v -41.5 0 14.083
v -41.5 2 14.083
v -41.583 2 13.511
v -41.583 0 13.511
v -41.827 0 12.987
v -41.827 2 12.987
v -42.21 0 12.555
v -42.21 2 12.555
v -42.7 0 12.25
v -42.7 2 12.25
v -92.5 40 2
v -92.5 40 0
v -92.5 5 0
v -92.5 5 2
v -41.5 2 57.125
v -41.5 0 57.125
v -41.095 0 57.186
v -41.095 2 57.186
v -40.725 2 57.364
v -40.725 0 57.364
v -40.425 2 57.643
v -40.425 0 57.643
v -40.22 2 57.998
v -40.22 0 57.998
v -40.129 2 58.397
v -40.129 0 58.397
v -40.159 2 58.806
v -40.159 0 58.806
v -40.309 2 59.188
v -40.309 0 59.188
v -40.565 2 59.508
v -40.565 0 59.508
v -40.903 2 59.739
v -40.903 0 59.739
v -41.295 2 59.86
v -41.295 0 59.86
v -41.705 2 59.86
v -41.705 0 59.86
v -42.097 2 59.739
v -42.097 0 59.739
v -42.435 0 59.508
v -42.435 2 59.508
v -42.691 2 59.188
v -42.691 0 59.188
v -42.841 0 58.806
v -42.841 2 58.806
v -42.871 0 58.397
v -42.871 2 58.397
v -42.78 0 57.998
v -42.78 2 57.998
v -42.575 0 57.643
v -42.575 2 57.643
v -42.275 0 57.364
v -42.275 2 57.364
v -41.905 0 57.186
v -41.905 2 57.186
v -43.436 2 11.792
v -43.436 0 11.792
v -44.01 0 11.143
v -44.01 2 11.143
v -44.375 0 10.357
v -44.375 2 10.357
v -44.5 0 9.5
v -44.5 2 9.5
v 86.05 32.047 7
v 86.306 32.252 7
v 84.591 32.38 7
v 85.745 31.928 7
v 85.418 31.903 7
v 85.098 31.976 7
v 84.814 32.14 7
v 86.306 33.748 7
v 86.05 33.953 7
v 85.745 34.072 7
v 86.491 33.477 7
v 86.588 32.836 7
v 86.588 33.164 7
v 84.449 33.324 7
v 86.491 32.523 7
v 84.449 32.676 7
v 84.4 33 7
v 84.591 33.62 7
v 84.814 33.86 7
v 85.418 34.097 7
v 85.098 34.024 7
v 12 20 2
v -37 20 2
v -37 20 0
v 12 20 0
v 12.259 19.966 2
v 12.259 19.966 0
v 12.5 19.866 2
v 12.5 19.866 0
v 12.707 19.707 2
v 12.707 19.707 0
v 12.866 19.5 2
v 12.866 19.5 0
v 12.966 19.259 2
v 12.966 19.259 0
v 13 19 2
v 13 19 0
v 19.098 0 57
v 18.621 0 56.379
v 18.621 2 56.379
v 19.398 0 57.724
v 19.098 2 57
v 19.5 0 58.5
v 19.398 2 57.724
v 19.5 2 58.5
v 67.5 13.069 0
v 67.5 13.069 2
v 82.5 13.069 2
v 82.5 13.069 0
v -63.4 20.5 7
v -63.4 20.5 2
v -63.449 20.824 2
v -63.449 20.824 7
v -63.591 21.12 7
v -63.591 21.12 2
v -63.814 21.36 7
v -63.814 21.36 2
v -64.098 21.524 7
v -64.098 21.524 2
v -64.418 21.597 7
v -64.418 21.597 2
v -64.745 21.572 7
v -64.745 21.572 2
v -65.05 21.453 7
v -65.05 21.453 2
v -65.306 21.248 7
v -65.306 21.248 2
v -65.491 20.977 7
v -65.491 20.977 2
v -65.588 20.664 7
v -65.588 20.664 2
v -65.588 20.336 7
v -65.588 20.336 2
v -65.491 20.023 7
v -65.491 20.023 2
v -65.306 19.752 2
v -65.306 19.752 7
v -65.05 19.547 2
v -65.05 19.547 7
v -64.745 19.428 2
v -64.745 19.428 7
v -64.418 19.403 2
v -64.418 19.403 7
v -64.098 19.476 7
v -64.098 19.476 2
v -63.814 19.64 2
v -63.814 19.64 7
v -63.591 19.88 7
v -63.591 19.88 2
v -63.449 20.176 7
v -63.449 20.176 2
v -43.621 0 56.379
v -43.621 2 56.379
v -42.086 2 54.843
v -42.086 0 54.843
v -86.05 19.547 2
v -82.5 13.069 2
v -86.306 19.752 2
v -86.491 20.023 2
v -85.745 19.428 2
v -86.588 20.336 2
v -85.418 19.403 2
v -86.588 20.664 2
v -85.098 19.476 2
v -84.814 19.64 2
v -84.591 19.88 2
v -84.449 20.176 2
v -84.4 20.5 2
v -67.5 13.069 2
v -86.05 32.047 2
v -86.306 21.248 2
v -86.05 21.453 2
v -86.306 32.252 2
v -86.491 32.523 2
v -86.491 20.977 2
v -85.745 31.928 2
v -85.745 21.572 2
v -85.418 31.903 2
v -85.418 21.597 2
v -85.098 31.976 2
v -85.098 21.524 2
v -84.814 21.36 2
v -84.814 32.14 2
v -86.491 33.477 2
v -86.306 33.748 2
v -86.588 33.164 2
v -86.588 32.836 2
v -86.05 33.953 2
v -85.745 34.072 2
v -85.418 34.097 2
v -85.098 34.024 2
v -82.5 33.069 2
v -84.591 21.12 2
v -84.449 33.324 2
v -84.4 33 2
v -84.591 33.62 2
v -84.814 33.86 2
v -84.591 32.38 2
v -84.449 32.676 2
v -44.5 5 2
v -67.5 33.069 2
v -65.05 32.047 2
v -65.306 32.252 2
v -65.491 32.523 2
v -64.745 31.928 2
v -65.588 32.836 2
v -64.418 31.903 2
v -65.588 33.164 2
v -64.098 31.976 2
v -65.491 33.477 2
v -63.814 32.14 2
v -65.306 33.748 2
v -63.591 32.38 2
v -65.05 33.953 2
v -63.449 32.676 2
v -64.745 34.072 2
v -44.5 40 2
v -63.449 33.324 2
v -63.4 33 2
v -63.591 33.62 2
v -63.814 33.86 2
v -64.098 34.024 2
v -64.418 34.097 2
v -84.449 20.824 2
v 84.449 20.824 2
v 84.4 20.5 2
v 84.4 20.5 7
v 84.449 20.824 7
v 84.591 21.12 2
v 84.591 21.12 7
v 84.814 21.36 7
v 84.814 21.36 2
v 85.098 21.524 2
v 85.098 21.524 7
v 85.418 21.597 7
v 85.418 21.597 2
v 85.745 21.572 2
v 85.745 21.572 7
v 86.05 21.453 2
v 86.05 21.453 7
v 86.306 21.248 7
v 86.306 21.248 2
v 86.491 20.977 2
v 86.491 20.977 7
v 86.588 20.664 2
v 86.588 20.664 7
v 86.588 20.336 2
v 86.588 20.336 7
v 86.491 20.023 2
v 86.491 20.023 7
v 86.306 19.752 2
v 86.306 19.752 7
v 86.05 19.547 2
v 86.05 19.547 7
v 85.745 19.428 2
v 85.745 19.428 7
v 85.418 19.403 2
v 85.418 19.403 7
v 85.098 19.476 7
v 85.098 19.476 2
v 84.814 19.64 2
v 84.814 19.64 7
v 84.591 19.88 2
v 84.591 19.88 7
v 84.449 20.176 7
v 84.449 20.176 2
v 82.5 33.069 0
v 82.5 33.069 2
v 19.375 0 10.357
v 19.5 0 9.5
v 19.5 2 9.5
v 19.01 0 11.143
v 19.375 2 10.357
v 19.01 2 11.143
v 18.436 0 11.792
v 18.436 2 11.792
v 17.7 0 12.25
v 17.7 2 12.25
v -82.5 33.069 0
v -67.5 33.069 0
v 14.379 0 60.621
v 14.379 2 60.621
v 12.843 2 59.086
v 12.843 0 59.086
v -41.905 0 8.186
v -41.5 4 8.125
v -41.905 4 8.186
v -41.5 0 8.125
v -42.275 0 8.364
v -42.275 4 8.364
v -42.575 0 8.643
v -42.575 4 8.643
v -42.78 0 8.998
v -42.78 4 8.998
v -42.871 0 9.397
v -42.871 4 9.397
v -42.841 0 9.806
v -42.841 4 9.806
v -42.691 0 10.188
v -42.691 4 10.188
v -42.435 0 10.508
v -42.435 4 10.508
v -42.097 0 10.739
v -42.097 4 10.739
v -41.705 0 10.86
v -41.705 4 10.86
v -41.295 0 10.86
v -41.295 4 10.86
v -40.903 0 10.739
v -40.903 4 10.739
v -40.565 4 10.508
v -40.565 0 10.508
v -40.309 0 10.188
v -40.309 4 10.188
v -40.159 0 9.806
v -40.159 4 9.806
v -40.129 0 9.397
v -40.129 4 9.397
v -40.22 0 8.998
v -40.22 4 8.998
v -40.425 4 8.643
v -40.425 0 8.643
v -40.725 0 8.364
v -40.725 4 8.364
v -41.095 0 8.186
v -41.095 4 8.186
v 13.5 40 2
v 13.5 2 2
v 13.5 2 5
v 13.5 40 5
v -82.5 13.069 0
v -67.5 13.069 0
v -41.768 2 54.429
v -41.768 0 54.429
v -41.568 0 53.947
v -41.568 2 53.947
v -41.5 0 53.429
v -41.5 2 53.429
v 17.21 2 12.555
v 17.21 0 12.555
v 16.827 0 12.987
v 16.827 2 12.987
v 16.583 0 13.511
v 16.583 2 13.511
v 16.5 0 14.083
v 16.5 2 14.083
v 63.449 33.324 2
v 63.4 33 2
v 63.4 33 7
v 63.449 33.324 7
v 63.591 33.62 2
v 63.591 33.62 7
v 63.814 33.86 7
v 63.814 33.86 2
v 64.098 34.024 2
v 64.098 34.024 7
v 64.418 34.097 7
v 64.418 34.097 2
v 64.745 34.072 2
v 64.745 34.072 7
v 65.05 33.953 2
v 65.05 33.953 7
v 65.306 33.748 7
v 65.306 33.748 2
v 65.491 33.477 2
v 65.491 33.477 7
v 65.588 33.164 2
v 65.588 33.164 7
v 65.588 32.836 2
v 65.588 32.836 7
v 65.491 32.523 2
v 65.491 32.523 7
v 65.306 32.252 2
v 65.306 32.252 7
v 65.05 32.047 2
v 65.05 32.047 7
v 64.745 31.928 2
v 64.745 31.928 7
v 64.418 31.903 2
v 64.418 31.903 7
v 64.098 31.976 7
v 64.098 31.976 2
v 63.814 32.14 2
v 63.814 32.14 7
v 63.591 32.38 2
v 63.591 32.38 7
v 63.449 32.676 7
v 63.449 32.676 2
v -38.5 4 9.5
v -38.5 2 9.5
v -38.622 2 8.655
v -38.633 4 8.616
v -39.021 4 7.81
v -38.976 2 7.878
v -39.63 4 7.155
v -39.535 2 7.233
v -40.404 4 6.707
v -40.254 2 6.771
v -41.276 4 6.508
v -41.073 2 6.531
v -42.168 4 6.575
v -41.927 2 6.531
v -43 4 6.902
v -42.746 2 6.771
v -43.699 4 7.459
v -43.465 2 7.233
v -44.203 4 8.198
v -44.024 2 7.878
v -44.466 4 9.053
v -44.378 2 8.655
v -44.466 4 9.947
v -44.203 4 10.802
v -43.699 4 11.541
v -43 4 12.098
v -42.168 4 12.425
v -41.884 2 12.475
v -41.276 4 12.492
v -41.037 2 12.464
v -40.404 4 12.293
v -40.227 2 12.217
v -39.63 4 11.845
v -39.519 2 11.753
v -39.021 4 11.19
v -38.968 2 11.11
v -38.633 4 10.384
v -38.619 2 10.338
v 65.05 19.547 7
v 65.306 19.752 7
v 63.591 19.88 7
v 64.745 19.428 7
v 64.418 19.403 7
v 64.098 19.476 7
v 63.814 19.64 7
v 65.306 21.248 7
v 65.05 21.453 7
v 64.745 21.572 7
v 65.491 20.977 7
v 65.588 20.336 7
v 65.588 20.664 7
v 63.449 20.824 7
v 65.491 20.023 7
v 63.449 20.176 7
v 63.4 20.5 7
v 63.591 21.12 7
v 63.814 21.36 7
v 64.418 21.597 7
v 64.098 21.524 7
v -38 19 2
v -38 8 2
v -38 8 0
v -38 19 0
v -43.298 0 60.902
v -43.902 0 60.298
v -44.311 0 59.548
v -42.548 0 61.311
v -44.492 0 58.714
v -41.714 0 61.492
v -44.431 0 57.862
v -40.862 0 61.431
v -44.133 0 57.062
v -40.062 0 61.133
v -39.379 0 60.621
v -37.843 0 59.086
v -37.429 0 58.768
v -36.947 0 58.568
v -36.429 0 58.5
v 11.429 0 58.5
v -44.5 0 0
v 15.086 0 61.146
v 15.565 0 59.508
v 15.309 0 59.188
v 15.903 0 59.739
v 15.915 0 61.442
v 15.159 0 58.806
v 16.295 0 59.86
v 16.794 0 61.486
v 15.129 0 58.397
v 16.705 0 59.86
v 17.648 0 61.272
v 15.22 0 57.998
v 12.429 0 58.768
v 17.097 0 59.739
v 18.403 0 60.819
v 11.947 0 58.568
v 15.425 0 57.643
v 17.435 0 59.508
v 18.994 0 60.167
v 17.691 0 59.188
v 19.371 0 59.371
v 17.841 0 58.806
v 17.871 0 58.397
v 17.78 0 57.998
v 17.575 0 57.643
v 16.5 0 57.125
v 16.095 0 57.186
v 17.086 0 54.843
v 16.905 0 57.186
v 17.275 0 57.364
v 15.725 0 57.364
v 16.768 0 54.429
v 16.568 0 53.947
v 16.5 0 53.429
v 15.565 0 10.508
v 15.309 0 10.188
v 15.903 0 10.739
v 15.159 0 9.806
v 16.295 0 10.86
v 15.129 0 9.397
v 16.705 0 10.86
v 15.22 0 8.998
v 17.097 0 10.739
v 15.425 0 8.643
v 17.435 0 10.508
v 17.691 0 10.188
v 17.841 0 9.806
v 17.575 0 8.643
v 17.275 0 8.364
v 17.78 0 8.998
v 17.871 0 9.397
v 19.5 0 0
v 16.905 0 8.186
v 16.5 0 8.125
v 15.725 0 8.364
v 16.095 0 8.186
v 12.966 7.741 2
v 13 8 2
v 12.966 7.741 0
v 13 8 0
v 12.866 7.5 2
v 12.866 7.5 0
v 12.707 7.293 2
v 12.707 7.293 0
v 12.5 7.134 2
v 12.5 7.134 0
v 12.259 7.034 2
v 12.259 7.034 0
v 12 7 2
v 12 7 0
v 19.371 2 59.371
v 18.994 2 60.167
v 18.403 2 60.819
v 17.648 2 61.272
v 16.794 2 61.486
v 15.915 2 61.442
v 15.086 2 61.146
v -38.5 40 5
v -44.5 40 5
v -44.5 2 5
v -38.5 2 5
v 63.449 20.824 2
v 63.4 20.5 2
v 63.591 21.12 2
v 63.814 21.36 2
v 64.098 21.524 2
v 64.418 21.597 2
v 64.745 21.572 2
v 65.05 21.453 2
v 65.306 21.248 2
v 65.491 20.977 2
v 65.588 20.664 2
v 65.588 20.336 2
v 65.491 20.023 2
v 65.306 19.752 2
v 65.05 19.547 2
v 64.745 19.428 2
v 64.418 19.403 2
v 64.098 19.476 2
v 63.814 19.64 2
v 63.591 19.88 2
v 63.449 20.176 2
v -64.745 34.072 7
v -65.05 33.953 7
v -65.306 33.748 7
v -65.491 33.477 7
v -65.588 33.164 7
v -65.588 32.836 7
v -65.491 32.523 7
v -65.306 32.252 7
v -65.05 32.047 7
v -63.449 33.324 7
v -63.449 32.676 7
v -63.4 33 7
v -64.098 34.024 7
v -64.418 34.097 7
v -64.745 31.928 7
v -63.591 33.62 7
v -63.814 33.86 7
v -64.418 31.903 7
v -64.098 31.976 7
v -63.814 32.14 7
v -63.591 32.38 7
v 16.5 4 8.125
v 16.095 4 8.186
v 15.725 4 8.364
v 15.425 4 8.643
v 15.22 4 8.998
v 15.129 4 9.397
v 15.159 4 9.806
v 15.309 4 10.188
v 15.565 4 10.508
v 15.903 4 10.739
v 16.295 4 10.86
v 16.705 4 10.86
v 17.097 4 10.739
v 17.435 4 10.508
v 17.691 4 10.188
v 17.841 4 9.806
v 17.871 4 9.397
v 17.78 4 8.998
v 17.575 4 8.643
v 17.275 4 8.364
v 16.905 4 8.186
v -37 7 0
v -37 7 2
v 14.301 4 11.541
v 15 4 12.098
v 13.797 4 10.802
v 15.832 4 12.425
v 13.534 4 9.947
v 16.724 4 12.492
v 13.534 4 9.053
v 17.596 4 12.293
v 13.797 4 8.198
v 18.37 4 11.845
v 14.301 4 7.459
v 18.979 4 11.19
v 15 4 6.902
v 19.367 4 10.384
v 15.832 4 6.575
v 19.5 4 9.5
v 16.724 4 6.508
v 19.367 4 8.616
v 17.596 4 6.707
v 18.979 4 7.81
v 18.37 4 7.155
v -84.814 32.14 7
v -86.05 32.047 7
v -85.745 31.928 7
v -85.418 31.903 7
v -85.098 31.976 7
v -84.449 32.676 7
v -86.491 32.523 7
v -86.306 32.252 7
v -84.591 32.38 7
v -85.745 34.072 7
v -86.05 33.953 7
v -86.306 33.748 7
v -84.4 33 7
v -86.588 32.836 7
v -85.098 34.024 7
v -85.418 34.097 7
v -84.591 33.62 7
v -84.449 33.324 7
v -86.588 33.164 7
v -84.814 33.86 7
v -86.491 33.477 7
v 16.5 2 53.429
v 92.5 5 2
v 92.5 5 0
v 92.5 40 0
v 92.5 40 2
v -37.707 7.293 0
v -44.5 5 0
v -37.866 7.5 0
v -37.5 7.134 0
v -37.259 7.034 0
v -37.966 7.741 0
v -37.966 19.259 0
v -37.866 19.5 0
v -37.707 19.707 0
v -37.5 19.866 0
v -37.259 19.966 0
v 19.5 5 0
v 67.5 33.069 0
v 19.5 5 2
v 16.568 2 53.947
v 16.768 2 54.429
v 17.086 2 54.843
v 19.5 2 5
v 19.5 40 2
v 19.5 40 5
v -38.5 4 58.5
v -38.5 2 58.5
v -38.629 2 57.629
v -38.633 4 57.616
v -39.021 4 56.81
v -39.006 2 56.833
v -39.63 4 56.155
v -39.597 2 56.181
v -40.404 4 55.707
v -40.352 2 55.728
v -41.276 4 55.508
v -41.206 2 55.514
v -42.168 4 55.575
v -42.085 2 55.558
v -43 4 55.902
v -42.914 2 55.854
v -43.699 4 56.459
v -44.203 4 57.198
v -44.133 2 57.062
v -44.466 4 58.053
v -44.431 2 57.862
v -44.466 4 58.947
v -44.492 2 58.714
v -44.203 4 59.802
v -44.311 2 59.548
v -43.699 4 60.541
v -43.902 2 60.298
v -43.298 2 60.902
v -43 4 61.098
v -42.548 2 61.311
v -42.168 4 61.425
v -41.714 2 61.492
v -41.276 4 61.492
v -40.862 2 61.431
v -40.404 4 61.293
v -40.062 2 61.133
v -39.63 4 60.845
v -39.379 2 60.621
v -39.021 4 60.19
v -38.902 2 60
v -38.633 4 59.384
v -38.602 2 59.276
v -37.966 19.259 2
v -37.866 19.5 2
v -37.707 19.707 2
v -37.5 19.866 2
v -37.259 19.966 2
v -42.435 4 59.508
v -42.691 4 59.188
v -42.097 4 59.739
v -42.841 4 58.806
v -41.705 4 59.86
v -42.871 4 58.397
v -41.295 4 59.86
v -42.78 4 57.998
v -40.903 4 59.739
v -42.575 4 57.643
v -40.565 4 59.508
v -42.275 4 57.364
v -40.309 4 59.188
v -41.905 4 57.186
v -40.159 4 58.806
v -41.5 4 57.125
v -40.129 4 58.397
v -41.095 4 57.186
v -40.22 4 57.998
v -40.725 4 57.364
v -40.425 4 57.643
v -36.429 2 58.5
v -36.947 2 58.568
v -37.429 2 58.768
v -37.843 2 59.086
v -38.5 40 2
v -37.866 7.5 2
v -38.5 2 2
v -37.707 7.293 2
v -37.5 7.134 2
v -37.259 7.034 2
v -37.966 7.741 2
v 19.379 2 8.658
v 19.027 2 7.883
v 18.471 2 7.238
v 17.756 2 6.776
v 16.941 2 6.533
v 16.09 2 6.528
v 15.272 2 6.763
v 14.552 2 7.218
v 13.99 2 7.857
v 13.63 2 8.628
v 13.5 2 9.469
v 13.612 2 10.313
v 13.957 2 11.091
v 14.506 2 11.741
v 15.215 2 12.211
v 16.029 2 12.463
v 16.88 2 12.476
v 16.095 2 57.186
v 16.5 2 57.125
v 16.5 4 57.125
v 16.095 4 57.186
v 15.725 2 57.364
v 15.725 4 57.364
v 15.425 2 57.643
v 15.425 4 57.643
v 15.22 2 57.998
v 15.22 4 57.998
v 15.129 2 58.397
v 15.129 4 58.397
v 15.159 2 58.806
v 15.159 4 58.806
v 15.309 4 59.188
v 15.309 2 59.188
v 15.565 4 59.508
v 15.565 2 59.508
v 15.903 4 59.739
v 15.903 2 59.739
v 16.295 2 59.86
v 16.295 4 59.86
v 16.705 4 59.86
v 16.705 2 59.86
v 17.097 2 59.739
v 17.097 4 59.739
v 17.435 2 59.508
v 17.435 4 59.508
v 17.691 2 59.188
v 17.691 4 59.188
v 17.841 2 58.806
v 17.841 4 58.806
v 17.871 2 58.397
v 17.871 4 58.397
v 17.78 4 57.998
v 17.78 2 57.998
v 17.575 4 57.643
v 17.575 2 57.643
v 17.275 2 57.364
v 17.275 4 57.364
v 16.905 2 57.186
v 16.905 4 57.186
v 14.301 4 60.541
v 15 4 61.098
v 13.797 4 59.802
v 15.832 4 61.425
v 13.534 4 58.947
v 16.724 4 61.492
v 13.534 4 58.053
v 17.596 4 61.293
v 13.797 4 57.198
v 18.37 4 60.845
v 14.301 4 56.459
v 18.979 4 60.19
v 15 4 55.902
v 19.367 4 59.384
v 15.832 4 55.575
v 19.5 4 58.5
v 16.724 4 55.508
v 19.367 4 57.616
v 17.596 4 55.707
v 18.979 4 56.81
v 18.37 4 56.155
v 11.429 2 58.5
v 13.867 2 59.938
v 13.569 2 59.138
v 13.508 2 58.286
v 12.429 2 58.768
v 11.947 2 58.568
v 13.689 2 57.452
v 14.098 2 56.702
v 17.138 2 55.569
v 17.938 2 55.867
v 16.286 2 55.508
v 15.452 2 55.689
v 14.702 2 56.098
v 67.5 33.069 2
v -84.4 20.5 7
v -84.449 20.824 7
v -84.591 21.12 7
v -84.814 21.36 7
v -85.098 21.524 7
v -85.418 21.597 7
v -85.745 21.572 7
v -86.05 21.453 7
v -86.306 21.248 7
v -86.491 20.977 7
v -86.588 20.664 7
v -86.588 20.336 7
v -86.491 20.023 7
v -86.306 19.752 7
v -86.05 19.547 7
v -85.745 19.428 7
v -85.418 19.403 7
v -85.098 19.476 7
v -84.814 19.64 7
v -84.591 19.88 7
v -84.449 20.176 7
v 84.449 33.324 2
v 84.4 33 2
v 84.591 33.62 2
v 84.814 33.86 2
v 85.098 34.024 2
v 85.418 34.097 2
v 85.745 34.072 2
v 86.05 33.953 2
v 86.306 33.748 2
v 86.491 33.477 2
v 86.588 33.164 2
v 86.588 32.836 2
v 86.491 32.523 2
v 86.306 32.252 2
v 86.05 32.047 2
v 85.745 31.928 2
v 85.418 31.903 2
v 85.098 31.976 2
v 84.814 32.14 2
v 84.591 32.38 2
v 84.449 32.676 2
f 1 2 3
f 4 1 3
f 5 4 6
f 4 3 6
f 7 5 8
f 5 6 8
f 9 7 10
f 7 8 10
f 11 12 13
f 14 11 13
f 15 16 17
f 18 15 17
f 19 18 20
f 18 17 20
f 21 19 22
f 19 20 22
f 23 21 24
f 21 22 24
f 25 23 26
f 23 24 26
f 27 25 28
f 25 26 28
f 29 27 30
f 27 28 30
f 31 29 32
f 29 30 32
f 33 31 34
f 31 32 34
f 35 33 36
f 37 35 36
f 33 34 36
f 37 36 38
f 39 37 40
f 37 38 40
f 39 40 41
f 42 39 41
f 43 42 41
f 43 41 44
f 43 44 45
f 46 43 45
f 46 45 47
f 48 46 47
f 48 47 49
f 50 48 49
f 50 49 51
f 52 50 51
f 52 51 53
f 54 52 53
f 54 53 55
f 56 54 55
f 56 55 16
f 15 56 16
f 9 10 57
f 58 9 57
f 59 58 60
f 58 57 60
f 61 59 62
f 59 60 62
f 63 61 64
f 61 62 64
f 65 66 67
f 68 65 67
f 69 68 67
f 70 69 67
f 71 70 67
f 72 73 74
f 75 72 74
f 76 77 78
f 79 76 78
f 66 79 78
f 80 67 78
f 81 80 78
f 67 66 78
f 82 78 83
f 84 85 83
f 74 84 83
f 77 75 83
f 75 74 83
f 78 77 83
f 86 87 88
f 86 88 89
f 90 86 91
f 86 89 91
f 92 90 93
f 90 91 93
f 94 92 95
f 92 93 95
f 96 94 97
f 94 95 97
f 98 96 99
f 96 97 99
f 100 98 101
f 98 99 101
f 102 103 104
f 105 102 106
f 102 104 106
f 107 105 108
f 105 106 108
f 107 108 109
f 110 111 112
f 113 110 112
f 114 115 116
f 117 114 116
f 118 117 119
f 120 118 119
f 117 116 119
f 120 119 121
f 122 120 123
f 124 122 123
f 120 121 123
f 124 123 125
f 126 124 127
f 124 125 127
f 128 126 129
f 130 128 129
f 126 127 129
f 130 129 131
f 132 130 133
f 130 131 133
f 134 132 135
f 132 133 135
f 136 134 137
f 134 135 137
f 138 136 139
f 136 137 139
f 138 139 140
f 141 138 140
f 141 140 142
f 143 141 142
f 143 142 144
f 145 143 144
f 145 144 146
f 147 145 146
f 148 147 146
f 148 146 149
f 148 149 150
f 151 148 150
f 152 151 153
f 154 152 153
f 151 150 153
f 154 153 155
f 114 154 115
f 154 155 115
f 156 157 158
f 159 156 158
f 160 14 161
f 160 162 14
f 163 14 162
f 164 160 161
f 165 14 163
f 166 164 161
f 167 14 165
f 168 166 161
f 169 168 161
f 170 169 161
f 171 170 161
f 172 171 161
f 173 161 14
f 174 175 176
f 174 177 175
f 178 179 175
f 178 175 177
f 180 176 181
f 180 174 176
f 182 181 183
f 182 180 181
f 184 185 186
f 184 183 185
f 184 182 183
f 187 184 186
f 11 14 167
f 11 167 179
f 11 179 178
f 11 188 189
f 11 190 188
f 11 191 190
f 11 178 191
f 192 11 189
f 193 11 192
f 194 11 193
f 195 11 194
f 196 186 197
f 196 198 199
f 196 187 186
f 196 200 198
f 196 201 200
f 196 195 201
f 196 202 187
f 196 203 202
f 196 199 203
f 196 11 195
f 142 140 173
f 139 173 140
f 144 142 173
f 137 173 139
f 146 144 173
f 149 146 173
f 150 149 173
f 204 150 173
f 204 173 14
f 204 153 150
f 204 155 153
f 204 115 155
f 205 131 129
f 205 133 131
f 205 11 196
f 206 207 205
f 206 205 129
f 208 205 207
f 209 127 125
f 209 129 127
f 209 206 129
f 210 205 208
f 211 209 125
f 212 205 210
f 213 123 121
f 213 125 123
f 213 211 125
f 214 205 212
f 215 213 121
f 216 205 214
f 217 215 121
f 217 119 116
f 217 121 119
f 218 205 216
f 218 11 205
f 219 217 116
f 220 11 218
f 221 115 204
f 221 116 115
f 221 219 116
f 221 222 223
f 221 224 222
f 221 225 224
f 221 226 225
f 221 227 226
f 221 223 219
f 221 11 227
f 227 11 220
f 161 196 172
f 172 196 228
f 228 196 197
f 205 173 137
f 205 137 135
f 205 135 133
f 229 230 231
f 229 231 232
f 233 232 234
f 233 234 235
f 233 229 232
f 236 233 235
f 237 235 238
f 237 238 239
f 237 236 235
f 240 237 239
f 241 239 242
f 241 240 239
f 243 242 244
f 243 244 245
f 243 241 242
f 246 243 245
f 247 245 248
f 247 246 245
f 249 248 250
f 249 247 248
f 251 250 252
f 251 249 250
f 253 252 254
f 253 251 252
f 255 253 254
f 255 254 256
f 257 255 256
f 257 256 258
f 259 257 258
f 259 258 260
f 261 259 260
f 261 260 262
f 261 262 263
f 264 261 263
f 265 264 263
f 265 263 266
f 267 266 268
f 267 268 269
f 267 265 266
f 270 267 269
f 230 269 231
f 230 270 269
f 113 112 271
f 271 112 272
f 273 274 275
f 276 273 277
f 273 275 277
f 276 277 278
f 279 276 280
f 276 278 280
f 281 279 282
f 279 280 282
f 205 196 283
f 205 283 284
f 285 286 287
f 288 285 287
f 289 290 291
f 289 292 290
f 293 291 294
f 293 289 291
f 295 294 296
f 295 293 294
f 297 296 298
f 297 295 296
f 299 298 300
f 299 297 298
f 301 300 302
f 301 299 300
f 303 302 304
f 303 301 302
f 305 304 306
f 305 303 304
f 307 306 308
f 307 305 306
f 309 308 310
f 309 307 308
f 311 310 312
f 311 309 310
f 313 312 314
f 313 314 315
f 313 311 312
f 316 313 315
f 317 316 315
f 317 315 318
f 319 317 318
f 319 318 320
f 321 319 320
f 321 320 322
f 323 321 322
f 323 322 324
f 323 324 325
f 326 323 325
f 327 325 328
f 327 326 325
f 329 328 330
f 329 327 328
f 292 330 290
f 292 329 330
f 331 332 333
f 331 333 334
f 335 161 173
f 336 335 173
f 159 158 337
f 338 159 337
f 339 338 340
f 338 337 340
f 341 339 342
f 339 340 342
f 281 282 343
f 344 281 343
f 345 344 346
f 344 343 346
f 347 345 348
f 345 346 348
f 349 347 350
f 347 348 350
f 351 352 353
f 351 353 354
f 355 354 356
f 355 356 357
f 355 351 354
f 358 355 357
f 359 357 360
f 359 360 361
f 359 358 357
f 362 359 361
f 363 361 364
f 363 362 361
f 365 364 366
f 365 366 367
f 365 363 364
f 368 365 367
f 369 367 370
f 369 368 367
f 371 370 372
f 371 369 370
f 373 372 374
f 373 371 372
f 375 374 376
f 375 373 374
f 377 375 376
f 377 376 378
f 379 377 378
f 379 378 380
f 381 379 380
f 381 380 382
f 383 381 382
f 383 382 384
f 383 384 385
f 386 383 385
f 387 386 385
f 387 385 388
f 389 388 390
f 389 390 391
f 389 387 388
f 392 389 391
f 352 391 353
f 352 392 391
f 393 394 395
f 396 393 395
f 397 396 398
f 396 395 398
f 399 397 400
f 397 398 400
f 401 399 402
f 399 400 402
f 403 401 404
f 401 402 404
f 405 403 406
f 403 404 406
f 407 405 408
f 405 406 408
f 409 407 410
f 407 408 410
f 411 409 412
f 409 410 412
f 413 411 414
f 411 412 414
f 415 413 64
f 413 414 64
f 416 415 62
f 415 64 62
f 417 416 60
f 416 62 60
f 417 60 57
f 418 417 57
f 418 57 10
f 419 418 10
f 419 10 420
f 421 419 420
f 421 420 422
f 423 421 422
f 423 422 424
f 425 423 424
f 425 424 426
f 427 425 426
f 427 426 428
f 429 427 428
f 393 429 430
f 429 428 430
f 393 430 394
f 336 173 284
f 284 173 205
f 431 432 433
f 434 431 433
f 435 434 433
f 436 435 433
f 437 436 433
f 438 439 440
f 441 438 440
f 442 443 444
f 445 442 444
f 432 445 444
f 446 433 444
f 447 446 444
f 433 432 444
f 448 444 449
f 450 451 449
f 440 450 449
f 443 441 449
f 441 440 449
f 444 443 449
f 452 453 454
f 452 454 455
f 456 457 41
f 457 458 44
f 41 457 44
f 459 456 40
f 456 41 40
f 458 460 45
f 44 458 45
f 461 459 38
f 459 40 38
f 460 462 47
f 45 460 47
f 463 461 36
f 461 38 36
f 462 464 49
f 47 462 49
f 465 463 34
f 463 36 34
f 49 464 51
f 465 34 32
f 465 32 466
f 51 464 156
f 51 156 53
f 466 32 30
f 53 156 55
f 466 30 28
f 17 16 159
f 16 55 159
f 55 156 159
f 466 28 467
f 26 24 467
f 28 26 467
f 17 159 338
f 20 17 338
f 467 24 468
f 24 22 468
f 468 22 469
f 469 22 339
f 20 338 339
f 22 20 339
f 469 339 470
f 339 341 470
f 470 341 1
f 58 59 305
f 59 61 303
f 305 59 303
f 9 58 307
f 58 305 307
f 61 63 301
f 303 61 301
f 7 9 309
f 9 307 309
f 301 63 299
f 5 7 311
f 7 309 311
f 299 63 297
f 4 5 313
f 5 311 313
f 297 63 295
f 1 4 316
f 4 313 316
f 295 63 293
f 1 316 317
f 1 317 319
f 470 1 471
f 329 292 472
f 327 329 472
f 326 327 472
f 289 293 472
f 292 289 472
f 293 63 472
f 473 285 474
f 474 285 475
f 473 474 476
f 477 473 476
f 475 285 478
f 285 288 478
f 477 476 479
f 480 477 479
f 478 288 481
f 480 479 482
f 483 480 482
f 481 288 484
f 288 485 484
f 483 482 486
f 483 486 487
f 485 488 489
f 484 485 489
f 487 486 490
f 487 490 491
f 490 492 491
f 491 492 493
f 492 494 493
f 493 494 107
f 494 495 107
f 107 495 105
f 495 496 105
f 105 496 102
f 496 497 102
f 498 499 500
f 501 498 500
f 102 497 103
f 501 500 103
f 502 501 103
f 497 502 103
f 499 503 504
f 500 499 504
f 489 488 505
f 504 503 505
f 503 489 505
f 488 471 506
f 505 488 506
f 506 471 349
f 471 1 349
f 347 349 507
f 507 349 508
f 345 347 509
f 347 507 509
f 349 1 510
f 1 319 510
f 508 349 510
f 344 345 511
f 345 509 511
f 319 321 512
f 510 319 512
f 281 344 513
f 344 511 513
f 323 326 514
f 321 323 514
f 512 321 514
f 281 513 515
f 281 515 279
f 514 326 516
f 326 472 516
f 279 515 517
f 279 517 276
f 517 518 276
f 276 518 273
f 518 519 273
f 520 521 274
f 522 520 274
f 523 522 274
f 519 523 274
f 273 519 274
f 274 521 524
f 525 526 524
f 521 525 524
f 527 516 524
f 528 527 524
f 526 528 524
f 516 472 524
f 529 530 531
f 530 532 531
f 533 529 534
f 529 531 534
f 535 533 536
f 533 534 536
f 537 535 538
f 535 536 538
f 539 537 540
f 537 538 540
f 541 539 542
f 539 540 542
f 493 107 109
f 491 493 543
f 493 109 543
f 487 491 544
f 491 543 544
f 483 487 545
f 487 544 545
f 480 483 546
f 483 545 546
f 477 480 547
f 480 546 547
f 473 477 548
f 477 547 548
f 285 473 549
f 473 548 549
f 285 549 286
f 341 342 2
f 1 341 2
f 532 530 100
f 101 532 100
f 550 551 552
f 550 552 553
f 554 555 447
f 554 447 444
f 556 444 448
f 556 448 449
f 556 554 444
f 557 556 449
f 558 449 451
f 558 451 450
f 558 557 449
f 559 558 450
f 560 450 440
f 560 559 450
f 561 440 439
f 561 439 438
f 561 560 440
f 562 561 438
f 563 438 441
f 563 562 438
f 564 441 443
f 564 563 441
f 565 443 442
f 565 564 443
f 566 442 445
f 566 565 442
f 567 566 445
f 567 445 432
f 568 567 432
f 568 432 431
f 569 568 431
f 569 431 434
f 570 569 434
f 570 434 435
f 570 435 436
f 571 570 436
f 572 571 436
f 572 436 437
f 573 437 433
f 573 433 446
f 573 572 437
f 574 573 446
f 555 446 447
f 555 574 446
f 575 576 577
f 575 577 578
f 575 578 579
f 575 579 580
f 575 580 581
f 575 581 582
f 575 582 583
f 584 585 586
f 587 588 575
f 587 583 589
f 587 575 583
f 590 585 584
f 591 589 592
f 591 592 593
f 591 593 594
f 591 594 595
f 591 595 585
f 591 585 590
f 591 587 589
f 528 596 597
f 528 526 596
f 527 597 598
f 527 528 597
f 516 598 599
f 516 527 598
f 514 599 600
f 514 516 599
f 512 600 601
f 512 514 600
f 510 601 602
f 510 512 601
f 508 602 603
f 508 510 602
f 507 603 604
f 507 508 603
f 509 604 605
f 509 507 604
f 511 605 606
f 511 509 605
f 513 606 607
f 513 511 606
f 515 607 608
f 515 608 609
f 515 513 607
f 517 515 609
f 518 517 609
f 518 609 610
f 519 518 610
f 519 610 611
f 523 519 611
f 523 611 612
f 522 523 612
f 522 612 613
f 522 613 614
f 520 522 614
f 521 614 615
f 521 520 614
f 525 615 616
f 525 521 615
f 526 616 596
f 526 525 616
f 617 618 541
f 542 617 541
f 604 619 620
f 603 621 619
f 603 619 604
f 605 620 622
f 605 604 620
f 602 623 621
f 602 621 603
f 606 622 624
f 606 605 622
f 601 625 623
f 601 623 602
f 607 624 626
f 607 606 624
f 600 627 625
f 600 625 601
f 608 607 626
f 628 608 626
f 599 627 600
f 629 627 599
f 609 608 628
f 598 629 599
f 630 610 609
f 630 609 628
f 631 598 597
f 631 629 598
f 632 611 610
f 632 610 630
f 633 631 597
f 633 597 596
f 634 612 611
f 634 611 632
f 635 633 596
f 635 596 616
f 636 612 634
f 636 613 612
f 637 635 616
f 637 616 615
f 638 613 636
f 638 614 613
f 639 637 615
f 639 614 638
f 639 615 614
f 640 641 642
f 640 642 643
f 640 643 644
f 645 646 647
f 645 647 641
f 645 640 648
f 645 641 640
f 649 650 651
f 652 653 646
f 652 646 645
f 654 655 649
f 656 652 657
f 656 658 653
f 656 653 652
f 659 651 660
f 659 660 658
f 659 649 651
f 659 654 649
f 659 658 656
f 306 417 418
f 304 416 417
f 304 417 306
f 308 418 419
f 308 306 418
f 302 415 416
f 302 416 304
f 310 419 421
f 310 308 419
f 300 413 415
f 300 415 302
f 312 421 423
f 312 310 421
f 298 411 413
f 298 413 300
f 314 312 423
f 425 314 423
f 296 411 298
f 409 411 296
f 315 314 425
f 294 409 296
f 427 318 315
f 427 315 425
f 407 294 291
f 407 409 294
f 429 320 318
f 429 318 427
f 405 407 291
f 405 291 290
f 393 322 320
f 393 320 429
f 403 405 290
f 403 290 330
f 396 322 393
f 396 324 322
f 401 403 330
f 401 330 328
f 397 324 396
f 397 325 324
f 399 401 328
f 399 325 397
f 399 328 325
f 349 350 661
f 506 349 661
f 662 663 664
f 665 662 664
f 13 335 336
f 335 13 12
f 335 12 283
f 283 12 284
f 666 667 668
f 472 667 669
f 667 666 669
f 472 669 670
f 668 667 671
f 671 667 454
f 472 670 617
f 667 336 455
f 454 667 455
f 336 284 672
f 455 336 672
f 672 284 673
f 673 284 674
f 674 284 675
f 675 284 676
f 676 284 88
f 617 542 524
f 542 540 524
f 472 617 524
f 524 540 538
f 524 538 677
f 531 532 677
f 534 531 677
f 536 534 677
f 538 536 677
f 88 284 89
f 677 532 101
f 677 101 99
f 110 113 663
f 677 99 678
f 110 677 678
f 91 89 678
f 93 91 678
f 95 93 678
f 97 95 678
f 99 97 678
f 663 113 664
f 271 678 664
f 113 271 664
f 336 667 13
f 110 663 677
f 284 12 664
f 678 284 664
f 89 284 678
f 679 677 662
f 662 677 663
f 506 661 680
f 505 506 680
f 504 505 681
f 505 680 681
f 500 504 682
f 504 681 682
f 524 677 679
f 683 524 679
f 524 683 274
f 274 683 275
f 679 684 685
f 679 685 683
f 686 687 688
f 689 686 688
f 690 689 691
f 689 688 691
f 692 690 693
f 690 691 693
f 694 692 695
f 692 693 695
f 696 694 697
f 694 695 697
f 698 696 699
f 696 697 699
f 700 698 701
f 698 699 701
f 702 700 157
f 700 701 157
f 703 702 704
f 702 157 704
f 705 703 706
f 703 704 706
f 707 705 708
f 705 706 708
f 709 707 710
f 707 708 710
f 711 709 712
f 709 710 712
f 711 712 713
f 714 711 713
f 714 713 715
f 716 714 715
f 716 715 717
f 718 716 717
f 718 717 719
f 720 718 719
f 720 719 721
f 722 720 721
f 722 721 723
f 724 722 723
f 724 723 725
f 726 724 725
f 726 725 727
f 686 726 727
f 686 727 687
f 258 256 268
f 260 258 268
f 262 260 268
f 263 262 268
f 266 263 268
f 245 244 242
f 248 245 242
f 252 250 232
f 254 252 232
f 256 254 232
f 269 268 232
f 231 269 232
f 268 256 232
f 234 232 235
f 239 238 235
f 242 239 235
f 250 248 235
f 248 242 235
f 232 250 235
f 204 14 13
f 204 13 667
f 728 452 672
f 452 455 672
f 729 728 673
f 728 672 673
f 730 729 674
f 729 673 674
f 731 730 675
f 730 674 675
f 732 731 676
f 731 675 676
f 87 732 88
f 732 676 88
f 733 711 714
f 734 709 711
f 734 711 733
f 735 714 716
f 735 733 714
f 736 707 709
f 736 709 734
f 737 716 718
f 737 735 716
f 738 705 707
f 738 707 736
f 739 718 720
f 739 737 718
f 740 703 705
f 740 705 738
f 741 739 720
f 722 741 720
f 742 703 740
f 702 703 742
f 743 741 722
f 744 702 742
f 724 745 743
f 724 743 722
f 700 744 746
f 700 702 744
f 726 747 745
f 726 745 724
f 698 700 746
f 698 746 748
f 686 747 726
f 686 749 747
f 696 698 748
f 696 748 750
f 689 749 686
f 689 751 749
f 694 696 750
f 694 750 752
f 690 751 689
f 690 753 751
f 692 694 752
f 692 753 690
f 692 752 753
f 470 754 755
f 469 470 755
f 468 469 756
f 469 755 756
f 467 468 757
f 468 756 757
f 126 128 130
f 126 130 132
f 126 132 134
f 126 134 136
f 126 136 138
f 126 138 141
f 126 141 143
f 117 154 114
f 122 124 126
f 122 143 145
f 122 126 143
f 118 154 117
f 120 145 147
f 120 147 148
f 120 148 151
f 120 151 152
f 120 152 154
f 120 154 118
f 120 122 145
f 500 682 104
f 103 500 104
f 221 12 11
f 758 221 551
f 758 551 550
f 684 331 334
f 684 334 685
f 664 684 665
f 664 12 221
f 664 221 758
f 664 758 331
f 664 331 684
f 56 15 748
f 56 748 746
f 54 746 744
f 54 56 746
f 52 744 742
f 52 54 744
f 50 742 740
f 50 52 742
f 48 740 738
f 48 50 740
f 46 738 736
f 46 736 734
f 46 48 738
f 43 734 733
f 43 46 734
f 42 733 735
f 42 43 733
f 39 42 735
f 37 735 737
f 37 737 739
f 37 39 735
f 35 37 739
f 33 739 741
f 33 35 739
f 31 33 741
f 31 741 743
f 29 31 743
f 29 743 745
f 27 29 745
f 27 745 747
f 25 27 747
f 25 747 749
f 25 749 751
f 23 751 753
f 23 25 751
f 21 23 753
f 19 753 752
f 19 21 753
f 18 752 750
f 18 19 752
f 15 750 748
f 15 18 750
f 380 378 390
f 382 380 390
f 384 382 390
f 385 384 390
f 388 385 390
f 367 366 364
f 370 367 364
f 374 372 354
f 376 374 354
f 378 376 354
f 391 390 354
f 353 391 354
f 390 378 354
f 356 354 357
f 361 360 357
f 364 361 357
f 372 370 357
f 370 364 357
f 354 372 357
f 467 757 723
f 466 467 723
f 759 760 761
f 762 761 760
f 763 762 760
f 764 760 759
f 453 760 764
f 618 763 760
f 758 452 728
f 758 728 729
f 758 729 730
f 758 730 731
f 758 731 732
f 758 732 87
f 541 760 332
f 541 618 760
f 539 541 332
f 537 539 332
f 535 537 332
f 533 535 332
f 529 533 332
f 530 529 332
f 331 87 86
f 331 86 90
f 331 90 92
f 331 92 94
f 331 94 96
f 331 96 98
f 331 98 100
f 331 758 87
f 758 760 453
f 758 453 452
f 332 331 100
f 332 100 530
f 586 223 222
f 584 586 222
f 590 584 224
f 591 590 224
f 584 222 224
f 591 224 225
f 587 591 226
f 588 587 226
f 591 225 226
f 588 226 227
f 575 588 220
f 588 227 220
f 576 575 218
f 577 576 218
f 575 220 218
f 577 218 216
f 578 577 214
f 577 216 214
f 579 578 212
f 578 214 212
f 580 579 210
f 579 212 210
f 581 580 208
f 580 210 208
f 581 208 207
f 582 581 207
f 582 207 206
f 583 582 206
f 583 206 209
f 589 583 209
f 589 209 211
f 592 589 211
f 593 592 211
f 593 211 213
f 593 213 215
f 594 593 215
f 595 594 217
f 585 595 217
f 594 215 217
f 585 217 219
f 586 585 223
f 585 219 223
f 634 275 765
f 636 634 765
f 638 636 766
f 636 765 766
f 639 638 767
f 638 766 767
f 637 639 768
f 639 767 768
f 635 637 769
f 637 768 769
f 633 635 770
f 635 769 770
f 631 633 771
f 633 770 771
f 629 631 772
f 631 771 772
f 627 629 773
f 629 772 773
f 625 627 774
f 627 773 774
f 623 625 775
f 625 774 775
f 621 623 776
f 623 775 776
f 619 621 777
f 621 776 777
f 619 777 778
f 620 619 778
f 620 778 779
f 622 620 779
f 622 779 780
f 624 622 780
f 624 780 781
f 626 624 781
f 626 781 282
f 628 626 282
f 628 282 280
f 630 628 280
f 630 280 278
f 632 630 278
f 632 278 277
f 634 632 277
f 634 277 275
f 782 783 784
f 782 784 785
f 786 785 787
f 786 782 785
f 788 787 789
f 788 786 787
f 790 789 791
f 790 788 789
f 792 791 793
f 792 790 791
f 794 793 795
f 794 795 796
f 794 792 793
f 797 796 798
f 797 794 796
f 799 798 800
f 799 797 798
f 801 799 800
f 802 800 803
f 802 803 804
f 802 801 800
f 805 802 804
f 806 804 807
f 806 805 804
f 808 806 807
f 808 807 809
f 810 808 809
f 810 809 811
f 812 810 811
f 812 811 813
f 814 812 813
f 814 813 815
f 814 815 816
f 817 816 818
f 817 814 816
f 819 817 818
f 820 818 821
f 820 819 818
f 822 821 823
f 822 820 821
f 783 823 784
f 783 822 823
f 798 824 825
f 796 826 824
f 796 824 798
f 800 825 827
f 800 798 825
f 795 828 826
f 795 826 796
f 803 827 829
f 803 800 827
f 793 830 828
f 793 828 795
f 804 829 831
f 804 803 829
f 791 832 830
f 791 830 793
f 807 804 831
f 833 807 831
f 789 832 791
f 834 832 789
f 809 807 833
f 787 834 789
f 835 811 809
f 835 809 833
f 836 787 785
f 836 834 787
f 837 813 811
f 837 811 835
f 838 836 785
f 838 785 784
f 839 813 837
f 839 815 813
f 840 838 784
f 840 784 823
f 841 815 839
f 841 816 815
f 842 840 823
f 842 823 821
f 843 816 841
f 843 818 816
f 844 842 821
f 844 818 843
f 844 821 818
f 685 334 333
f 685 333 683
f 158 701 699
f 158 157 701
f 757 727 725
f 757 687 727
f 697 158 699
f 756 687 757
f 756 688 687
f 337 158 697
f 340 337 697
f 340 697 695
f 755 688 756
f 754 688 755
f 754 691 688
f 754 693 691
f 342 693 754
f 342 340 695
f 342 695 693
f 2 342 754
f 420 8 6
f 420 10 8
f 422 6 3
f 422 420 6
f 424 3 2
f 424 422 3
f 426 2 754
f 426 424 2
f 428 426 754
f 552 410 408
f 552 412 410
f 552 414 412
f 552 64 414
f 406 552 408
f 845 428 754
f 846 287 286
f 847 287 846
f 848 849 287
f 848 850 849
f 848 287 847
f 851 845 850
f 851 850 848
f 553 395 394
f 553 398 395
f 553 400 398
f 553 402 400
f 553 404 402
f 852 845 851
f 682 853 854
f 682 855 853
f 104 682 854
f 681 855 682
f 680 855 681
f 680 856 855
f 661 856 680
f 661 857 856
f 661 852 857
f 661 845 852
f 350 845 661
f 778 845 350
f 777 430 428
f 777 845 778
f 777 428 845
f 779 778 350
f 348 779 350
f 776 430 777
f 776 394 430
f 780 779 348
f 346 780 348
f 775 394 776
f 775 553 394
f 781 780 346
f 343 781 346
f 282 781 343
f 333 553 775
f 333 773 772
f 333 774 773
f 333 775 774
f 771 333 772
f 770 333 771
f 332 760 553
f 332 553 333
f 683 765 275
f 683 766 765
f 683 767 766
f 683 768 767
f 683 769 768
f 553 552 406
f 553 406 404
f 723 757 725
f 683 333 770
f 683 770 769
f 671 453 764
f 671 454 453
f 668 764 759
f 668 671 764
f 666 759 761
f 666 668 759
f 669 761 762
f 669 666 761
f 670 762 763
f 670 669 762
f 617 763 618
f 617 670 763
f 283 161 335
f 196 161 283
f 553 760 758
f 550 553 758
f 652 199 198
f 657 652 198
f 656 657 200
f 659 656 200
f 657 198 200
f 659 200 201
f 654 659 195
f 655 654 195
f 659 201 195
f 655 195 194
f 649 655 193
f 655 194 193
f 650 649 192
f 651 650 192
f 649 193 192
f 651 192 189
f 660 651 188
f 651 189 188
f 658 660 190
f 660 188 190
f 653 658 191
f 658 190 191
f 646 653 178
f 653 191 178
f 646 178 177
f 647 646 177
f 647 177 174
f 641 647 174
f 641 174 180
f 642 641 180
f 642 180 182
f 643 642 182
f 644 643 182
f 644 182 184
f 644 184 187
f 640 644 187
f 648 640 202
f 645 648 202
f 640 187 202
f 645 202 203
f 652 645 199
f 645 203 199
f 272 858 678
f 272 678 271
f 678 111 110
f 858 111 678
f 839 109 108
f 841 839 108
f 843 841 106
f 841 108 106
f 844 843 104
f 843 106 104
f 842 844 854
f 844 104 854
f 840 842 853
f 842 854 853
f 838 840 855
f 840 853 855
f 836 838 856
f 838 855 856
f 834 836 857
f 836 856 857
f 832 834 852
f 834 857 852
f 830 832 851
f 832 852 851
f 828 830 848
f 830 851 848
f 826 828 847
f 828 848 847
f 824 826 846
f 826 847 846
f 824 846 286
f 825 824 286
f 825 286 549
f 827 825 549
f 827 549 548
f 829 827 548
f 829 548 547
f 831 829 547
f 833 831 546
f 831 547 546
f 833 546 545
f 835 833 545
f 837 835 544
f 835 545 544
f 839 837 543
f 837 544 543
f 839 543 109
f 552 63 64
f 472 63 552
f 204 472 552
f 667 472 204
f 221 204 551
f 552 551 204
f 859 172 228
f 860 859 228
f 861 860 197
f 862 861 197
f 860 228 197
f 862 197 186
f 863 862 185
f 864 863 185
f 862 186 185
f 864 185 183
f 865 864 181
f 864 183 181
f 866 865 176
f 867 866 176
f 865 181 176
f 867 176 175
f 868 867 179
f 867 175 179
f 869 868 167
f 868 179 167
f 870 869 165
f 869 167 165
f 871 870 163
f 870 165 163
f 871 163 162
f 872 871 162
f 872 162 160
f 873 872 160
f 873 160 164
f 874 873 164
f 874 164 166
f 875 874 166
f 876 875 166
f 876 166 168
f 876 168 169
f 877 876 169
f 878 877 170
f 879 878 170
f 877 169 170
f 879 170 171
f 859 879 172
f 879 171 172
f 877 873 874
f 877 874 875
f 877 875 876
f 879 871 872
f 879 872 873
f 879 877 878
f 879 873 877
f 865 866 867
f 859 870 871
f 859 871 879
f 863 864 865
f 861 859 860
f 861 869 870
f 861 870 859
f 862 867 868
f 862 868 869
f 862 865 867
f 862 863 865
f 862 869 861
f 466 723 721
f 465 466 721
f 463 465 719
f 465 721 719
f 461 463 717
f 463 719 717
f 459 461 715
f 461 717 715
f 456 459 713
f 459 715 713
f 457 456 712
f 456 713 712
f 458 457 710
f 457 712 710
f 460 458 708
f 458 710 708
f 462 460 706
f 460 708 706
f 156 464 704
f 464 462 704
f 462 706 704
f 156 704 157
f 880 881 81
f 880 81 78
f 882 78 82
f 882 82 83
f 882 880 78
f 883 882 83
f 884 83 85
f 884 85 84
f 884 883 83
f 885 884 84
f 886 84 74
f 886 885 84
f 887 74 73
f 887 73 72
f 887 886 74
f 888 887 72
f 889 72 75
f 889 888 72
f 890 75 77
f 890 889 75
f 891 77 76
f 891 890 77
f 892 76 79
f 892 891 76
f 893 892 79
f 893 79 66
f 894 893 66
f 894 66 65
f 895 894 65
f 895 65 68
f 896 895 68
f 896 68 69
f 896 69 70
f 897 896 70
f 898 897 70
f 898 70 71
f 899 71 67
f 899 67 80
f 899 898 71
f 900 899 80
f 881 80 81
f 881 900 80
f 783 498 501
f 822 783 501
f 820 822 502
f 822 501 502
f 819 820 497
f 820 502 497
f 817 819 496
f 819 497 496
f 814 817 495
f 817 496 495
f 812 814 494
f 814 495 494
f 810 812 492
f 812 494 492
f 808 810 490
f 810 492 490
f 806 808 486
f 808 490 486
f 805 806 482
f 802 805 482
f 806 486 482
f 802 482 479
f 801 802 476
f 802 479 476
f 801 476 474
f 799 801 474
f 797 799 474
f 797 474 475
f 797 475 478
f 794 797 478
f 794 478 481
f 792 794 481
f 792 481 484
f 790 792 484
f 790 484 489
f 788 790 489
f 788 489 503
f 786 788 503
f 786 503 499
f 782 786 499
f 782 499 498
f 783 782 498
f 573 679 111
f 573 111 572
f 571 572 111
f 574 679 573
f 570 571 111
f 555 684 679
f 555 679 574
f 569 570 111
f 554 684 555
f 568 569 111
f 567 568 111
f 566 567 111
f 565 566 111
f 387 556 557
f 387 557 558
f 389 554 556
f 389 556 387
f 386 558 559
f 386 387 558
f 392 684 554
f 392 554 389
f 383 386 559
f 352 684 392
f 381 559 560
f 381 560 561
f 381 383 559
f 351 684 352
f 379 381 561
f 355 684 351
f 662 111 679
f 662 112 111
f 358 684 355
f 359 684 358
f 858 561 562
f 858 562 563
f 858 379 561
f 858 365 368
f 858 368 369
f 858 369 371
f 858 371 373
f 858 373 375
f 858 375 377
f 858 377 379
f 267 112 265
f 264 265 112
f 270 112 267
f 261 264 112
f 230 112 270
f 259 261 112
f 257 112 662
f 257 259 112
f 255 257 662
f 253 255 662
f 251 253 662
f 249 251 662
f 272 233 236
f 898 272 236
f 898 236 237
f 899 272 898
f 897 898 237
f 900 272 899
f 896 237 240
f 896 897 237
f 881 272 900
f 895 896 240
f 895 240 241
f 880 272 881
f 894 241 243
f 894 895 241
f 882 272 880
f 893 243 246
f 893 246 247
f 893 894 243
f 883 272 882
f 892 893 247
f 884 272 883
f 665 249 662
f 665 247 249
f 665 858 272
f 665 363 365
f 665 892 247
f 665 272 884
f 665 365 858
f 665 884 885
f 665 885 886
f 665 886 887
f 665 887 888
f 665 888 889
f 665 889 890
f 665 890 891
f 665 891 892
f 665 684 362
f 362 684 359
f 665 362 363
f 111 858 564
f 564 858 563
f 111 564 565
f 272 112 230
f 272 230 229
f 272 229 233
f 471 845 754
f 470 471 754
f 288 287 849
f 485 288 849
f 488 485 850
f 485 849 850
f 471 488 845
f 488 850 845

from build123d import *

# Parameters (mm, degrees)
BOSS_EXTRUDE1_DEPTH = 2
SKETCH8_R           = 1.1
BOSS_EXTRUDE4_DEPTH = 5
SKETCH2_W           = 75
SKETCH2_H           = 2
BOSS_EXTRUDE2_DEPTH = 65
SKETCH9_W           = 15
SKETCH9_H           = 20
CUT_EXTRUDE2_DEPTH  = 120.921849552
SKETCH10_R          = 1.375
CUT_EXTRUDE3_DEPTH  = 122.017560709
SKETCH11_R          = 3
SKETCH11_R_2        = 1.375
BOSS_EXTRUDE5_DEPTH = 2
CUT_EXTRUDE4_DEPTH  = 121.371300566
SKETCH16_W          = 5.5
SKETCH16_H          = 5
CUT_EXTRUDE5_DEPTH  = 118.032046893
SKETCH17_W          = 6
SKETCH17_H          = 38
BOSS_EXTRUDE6_DEPTH = 3
SKETCH18_W          = 51
SKETCH18_H          = 13
CUT_EXTRUDE6_DEPTH  = 118.032046893
FILLET1_R           = 1


with BuildPart() as part:
    # Sketch1 → Boss-Extrude1 (new body)
    with BuildSketch(Plane.XY):
        Polygon((-50, 5), (-50, 0), (25, 0), (25, 5), (92.5, 5), (92.5, 40), (57.5, 40), (-57.5, 40), (-92.5, 40), (-92.5, 5), align=None)
    extrude(amount=BOSS_EXTRUDE1_DEPTH)

    # Sketch8 → Boss-Extrude4 (add)
    with BuildSketch(Plane.XY.offset(2)):
        with Locations((-85.5, 33)):
            Circle(SKETCH8_R)
        with Locations((-64.5, 33)):
            Circle(SKETCH8_R)
        with Locations((-85.5, 20.5)):
            Circle(SKETCH8_R)
        with Locations((-64.5, 20.5)):
            Circle(SKETCH8_R)
    boss_extrude4 = extrude(amount=BOSS_EXTRUDE4_DEPTH)

    # Mirror2: Boss-Extrude4 across plane
    add(boss_extrude4.mirror(Plane(origin=(0, 0, 0), x_dir=(0, 0, 1), z_dir=(1, 0, 0))))

    # Sketch2 → Boss-Extrude2 (add)
    with BuildSketch(Plane.XY.offset(2)):
        with Locations((-12.5, 1)):
            Rectangle(SKETCH2_W, SKETCH2_H)
    extrude(amount=BOSS_EXTRUDE2_DEPTH)

    # Sketch9 → Cut-Extrude2 (cut, through all)
    with BuildSketch(Plane.XY.offset(2)):
        with Locations((-75, 23.069)):
            Rectangle(SKETCH9_W, SKETCH9_H)
        with Locations((75, 23.069)):
            Rectangle(SKETCH9_W, SKETCH9_H)
    extrude(amount=-CUT_EXTRUDE2_DEPTH, mode=Mode.SUBTRACT)

    # Sketch10 → Cut-Extrude3 (cut, through all)
    with BuildSketch(Plane.XZ):
        with Locations(Location((-41.5, 58.5, 0), (0, 0, 270))):
            Circle(SKETCH10_R)
        with Locations(Location((-41.5, 9.5, 0), (0, 0, 270))):
            Circle(SKETCH10_R)
        with Locations(Location((16.5, 9.5, 0), (0, 0, 270))):
            Circle(SKETCH10_R)
        with Locations(Location((16.5, 58.5, 0), (0, 0, 270))):
            Circle(SKETCH10_R)
    extrude(amount=-CUT_EXTRUDE3_DEPTH, mode=Mode.SUBTRACT)

    # Sketch11 → Boss-Extrude5 (add)
    with BuildSketch(Plane(origin=(0, 2, 0), x_dir=(1, 0, 0), z_dir=(0, 1, 0))):
        with Locations((-41.5, -9.5)):
            Circle(SKETCH11_R)
        with Locations(Location((-41.5, -9.5, 0), (0, 0, 90))):
            Circle(SKETCH11_R_2, mode=Mode.SUBTRACT)
    boss_extrude5 = extrude(amount=BOSS_EXTRUDE5_DEPTH)

    # Sketch-Pattern1: Boss-Extrude5 at 3 more places
    with Locations((58, 0, 0), (58, 0, 49), (0, 0, 49)):
        add(boss_extrude5)

    # Sketch15 → Cut-Extrude4 (cut, through all)
    with BuildSketch(Plane(origin=(0, 2, 0), x_dir=(1, 0, 0), z_dir=(0, 1, 0))):
        with BuildLine():
            ThreePointArc((-42.7, -12.249545417), (-44.00998008, -11.143167673), (-44.5, -9.5))
            Line((-44.5, -9.5), (-44.5, -2))
            Line((-44.5, -2), (-50, -2))
            Line((-50, -2), (-50, -67))
            Line((-50, -67), (25, -67))
            Line((25, -67), (25, -2))
            Line((25, -2), (19.5, -2))
            Line((19.5, -2), (19.5, -9.5))
            ThreePointArc((19.5, -9.5), (19.00998008, -11.143167673), (17.7, -12.249545417))
            ThreePointArc((17.7, -12.249545417), (16.826679947, -12.98713058), (16.5, -14.082575695))
            Line((16.5, -14.082575695), (16.5, -53.428932188))
            ThreePointArc((16.5, -53.428932188), (16.652240935, -54.194299053), (17.085786438, -54.843145751))
            Line((17.085786438, -54.843145751), (18.621320344, -56.378679656))
            ThreePointArc((18.621320344, -56.378679656), (19.271638598, -57.351949703), (19.5, -58.5))
            ThreePointArc((19.5, -58.5), (17.648050297, -61.271638598), (14.378679656, -60.621320344))
            Line((14.378679656, -60.621320344), (12.843145751, -59.085786438))
            ThreePointArc((12.843145751, -59.085786438), (12.194299053, -58.652240935), (11.428932188, -58.5))
            Line((11.428932188, -58.5), (-36.428932188, -58.5))
            ThreePointArc((-36.428932188, -58.5), (-37.194299053, -58.652240935), (-37.843145751, -59.085786438))
            Line((-37.843145751, -59.085786438), (-39.378679656, -60.621320344))
            ThreePointArc((-39.378679656, -60.621320344), (-43.621320344, -60.621320344), (-43.621320344, -56.378679656))
            Line((-43.621320344, -56.378679656), (-42.085786438, -54.843145751))
            ThreePointArc((-42.085786438, -54.843145751), (-41.652240935, -54.194299053), (-41.5, -53.428932188))
            Line((-41.5, -53.428932188), (-41.5, -14.082575695))
            ThreePointArc((-41.5, -14.082575695), (-41.826679947, -12.98713058), (-42.7, -12.249545417))
        make_face()
    extrude(amount=-CUT_EXTRUDE4_DEPTH, mode=Mode.SUBTRACT)

    # Sketch16 → Cut-Extrude5 (cut, through all)
    with BuildSketch(Plane.XY.offset(2)):
        with Locations((-47.25, 2.5)):
            Rectangle(SKETCH16_W, SKETCH16_H)
        with Locations((22.25, 2.5)):
            Rectangle(SKETCH16_W, SKETCH16_H)
    extrude(amount=-CUT_EXTRUDE5_DEPTH, mode=Mode.SUBTRACT)

    # Sketch17 → Boss-Extrude6 (add)
    with BuildSketch(Plane.XY.offset(2)):
        with Locations((-41.5, 21)):
            Rectangle(SKETCH17_W, SKETCH17_H)
        with Locations((16.5, 21)):
            Rectangle(SKETCH17_W, SKETCH17_H)
    extrude(amount=BOSS_EXTRUDE6_DEPTH)

    # Sketch18 → Cut-Extrude6 (cut, through all)
    with BuildSketch(Plane.XY.offset(2)):
        with Locations((-12.5, 13.5)):
            Rectangle(SKETCH18_W, SKETCH18_H)
    extrude(amount=-CUT_EXTRUDE6_DEPTH, mode=Mode.SUBTRACT)

    # Fillet1
    fillet1_edges = [part.edges().sort_by_distance(p)[0] for p in [
        (-38, 20, 1),
        (13, 20, 1),
        (13, 7, 1),
        (-38, 7, 1),
    ]]
    fillet(fillet1_edges, radius=FILLET1_R)


solid = part.part
